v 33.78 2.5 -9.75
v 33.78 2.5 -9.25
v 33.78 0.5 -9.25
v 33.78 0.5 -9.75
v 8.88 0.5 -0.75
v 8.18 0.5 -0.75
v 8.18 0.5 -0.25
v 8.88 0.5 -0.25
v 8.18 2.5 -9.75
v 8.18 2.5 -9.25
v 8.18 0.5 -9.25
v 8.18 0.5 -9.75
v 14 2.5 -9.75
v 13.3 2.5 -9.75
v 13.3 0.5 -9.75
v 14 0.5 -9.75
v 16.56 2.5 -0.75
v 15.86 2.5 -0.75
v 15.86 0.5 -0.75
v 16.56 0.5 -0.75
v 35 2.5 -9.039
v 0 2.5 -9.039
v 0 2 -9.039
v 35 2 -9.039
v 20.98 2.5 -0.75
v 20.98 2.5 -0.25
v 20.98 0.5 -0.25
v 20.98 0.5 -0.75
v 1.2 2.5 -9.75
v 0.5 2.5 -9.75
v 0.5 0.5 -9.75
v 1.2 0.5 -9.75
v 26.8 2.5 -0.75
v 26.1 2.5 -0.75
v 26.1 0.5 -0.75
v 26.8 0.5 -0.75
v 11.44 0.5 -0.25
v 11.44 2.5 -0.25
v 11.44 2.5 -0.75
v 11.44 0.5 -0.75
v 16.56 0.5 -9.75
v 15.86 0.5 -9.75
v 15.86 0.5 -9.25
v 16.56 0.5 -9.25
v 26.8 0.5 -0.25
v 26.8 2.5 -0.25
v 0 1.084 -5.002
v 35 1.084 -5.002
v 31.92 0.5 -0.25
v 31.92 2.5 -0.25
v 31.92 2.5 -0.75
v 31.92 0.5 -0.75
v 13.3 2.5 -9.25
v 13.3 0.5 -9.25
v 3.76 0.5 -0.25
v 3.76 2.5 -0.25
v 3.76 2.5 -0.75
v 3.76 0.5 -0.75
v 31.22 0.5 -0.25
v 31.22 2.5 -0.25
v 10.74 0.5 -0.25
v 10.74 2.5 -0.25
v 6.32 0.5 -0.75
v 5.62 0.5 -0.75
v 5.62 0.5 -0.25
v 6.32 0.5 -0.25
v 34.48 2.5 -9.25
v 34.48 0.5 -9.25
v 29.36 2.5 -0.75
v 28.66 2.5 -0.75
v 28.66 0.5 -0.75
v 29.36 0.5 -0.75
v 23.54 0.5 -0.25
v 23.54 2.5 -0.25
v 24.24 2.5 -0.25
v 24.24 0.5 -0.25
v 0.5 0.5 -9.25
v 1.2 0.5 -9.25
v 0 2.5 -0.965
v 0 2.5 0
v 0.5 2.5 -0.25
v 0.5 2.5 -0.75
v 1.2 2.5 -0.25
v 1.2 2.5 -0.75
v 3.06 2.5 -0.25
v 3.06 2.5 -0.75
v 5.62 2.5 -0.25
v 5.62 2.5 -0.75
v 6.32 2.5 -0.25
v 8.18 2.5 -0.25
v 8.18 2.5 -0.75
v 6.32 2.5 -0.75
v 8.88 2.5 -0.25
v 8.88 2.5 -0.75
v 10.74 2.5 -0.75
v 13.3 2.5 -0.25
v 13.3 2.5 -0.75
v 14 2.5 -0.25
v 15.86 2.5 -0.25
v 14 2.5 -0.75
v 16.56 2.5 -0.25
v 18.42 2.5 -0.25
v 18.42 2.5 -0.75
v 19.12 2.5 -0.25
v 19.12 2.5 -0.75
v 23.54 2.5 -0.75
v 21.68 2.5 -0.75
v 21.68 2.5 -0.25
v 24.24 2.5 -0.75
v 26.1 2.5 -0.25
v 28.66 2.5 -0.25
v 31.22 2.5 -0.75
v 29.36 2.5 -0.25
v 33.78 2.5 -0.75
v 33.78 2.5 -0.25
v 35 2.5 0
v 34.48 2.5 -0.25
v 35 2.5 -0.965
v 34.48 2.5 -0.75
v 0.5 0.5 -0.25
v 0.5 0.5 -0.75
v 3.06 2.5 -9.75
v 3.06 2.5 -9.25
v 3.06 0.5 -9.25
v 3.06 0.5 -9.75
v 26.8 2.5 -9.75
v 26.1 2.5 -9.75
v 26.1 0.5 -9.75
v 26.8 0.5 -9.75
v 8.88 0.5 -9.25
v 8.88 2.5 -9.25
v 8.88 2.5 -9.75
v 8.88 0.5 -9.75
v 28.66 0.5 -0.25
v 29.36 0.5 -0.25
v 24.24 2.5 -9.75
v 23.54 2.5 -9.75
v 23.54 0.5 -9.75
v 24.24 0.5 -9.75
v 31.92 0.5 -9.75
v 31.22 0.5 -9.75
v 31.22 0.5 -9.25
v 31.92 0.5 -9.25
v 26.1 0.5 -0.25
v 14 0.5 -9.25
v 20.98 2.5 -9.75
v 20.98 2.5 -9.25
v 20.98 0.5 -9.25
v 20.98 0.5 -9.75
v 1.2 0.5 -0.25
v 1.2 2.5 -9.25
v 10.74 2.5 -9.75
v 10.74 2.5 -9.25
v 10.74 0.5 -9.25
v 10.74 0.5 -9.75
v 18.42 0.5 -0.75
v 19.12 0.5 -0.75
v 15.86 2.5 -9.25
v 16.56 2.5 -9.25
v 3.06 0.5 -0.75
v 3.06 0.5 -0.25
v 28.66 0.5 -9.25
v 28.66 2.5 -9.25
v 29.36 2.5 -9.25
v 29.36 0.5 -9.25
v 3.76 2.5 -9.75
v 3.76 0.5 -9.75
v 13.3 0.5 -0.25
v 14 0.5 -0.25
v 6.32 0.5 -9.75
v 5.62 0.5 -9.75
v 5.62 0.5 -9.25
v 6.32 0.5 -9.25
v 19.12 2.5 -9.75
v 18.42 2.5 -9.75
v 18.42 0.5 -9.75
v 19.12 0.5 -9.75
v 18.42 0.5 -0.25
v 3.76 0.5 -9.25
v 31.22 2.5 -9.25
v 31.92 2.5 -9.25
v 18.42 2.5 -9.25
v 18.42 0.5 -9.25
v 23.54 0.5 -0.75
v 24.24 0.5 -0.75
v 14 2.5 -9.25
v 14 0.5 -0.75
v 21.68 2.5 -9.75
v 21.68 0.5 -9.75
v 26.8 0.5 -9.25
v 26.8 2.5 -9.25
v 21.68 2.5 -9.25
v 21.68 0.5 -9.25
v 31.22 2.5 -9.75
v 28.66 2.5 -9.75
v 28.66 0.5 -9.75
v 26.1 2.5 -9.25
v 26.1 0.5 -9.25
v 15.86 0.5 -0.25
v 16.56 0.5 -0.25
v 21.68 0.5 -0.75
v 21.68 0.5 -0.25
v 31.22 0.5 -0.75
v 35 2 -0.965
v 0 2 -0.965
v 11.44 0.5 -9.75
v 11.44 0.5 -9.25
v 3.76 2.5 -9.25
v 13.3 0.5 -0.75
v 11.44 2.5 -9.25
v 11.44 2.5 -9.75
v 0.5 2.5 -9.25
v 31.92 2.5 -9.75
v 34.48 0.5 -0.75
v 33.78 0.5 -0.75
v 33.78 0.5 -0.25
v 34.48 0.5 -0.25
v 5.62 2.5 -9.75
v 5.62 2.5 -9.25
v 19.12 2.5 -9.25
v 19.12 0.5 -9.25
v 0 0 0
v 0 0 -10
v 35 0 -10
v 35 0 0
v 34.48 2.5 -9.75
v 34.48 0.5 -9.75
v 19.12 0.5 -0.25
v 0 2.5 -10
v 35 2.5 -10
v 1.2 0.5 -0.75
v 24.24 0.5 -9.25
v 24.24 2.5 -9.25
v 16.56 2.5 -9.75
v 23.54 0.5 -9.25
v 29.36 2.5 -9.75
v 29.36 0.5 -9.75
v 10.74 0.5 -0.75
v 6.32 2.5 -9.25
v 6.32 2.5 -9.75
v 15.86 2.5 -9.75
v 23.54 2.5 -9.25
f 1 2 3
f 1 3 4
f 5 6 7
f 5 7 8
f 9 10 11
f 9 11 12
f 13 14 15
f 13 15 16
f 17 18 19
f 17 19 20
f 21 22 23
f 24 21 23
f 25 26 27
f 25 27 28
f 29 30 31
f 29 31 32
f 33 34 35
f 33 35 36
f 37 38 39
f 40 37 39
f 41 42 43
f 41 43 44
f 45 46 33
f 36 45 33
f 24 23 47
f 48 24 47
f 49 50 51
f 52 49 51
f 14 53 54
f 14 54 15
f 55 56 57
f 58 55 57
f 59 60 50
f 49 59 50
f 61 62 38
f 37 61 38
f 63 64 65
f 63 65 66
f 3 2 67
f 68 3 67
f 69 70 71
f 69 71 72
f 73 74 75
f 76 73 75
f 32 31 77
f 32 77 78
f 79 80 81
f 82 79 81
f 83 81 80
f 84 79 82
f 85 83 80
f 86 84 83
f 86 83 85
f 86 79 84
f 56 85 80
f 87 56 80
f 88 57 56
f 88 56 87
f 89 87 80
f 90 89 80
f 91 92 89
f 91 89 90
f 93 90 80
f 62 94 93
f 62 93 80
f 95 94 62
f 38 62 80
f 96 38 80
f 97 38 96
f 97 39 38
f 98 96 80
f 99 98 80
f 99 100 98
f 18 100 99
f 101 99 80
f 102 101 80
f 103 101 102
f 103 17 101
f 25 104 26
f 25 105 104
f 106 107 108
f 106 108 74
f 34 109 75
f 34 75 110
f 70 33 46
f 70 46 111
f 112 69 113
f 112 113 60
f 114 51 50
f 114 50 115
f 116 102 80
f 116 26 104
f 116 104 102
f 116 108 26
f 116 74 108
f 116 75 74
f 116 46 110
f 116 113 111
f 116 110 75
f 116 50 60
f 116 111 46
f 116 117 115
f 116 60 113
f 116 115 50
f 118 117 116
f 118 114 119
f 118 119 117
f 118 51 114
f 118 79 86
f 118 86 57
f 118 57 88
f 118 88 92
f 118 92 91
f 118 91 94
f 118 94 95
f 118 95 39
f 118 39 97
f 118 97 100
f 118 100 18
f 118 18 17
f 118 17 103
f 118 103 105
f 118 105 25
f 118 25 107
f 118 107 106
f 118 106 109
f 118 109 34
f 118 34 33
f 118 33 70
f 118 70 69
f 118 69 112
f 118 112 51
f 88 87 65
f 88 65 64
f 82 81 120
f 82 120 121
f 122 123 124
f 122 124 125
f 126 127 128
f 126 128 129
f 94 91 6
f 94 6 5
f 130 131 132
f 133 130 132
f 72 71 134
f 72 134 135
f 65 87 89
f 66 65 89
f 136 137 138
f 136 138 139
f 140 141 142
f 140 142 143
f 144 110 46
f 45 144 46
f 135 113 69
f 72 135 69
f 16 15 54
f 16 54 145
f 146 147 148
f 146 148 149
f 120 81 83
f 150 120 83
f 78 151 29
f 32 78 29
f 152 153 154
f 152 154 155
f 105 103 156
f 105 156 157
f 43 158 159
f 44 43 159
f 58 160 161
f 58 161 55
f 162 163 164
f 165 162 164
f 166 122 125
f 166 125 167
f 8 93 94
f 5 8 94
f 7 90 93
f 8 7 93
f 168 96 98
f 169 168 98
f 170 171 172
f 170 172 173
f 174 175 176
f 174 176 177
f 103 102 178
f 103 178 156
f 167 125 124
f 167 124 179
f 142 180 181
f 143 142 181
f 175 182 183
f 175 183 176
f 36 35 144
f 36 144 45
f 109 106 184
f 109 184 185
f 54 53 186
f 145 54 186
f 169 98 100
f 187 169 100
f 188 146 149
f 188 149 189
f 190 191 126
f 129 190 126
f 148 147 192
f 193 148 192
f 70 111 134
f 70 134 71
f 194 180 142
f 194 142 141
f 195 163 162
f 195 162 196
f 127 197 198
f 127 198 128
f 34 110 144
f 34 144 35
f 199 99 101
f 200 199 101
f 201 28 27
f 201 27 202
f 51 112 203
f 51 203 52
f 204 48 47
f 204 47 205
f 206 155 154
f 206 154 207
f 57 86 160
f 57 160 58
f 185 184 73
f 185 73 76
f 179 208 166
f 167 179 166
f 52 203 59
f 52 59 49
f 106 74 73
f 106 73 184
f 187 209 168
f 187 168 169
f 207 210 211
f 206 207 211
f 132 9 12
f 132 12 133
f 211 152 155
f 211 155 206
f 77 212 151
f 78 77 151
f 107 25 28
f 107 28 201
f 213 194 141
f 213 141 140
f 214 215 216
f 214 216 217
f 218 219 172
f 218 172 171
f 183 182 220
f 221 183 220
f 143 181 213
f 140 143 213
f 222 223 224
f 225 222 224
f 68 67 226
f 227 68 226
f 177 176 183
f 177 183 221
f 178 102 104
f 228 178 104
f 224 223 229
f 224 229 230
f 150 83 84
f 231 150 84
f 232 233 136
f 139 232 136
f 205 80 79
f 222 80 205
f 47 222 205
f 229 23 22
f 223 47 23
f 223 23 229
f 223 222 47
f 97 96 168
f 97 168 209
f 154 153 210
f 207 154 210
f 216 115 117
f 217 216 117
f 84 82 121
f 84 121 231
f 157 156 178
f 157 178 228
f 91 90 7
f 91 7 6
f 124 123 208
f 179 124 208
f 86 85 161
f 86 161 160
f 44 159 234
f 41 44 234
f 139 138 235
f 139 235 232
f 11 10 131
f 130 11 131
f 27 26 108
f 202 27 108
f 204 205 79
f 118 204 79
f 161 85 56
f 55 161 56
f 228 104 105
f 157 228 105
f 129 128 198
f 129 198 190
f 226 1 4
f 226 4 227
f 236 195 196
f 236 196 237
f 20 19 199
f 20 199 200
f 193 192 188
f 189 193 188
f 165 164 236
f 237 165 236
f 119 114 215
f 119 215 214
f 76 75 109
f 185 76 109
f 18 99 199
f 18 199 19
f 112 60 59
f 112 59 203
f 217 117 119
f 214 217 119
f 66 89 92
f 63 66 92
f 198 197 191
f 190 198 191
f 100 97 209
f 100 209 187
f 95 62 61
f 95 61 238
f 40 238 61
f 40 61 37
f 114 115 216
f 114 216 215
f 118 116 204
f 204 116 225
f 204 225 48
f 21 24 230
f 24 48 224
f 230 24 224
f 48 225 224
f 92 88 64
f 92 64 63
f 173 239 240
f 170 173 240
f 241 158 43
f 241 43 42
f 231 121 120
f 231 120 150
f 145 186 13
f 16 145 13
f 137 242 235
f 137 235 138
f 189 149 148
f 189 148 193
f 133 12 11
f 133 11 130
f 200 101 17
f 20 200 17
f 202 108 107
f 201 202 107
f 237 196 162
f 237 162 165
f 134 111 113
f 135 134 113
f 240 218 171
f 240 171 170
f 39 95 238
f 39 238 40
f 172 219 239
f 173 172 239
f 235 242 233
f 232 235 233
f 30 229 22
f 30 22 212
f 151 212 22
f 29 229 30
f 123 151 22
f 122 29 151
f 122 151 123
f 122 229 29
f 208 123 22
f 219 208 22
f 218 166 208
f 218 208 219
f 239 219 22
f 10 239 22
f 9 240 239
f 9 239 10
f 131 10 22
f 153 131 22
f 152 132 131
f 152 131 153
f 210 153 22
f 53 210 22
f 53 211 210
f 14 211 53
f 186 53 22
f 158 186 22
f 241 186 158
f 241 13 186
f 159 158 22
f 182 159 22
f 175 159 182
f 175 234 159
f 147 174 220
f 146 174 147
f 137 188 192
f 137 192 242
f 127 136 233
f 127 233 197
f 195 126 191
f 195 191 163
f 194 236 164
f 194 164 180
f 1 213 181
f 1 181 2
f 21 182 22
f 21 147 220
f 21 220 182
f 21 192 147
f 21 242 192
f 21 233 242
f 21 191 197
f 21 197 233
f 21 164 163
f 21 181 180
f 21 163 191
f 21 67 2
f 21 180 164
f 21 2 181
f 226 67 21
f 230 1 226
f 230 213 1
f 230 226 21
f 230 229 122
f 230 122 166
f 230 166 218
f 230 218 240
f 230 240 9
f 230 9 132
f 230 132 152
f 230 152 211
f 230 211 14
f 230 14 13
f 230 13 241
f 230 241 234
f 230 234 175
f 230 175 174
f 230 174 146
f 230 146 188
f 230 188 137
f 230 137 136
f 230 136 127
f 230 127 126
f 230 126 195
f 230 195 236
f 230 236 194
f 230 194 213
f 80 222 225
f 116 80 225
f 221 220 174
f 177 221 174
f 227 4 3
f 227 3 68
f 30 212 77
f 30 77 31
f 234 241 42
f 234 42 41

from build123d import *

# Parameters (mm, degrees)
SKETCH2_W               = 35
SKETCH2_H               = 10
BOSS_EXTRUDE1_DEPTH     = 2.5
SKETCH3_W               = 0.7
SKETCH3_H               = 0.5
CUT_EXTRUDE1_DEPTH      = 2
LPATTERN1_COUNT         = 14
LPATTERN1_PITCH         = 2.56
LPATTERN1_COUNT_DIR2    = 2
LPATTERN1_PITCH_DIR2    = 9
CUT_EXTRUDE2_DEPTH      = 1
CUT_EXTRUDE2_DEPTH_BACK = 36


with BuildPart() as part:
    # Sketch2 → Boss-Extrude1 (new body)
    with BuildSketch(Plane(origin=(0, 0, 0), x_dir=(1, 0, 0), z_dir=(0, 1, 0))):
        with Locations((17.5, 5)):
            Rectangle(SKETCH2_W, SKETCH2_H)
    extrude(amount=BOSS_EXTRUDE1_DEPTH)

    # Sketch3 → Cut-Extrude1 (cut)
    with BuildSketch(Plane(origin=(0, 2.5, 0), x_dir=(1, 0, 0), z_dir=(0, 1, 0))):
        with Locations((0.85, 0.5)):
            Rectangle(SKETCH3_W, SKETCH3_H)
    cut_extrude1 = extrude(amount=-CUT_EXTRUDE1_DEPTH, mode=Mode.SUBTRACT)

    # LPattern1: Cut-Extrude1 14 × 2
    with Locations(*[(i * LPATTERN1_PITCH, 0, -j * LPATTERN1_PITCH_DIR2) for i in range(LPATTERN1_COUNT) for j in range(LPATTERN1_COUNT_DIR2) if (i, j) != (0, 0)]):
        add(cut_extrude1, mode=Mode.SUBTRACT)

    # Sketch4 → Cut-Extrude2 (cut, two sides)
    with BuildSketch(Plane.ZY) as cut_extrude2_sk:
        Polygon((-9.038587053, 31.255911699), (-9.038587053, 2.5), (-9.038587053, 2), (-5.001909552, 1.083533753), (-0.965232052, 2), (-0.965232052, 2.5), (-0.965232052, 31.255911699), (-0.965232052, 88.767735096), (-9.038587053, 88.767735096), align=None)
    extrude(amount=CUT_EXTRUDE2_DEPTH, mode=Mode.SUBTRACT)
    extrude(cut_extrude2_sk.sketch, amount=-CUT_EXTRUDE2_DEPTH_BACK, mode=Mode.SUBTRACT)


solid = part.part
